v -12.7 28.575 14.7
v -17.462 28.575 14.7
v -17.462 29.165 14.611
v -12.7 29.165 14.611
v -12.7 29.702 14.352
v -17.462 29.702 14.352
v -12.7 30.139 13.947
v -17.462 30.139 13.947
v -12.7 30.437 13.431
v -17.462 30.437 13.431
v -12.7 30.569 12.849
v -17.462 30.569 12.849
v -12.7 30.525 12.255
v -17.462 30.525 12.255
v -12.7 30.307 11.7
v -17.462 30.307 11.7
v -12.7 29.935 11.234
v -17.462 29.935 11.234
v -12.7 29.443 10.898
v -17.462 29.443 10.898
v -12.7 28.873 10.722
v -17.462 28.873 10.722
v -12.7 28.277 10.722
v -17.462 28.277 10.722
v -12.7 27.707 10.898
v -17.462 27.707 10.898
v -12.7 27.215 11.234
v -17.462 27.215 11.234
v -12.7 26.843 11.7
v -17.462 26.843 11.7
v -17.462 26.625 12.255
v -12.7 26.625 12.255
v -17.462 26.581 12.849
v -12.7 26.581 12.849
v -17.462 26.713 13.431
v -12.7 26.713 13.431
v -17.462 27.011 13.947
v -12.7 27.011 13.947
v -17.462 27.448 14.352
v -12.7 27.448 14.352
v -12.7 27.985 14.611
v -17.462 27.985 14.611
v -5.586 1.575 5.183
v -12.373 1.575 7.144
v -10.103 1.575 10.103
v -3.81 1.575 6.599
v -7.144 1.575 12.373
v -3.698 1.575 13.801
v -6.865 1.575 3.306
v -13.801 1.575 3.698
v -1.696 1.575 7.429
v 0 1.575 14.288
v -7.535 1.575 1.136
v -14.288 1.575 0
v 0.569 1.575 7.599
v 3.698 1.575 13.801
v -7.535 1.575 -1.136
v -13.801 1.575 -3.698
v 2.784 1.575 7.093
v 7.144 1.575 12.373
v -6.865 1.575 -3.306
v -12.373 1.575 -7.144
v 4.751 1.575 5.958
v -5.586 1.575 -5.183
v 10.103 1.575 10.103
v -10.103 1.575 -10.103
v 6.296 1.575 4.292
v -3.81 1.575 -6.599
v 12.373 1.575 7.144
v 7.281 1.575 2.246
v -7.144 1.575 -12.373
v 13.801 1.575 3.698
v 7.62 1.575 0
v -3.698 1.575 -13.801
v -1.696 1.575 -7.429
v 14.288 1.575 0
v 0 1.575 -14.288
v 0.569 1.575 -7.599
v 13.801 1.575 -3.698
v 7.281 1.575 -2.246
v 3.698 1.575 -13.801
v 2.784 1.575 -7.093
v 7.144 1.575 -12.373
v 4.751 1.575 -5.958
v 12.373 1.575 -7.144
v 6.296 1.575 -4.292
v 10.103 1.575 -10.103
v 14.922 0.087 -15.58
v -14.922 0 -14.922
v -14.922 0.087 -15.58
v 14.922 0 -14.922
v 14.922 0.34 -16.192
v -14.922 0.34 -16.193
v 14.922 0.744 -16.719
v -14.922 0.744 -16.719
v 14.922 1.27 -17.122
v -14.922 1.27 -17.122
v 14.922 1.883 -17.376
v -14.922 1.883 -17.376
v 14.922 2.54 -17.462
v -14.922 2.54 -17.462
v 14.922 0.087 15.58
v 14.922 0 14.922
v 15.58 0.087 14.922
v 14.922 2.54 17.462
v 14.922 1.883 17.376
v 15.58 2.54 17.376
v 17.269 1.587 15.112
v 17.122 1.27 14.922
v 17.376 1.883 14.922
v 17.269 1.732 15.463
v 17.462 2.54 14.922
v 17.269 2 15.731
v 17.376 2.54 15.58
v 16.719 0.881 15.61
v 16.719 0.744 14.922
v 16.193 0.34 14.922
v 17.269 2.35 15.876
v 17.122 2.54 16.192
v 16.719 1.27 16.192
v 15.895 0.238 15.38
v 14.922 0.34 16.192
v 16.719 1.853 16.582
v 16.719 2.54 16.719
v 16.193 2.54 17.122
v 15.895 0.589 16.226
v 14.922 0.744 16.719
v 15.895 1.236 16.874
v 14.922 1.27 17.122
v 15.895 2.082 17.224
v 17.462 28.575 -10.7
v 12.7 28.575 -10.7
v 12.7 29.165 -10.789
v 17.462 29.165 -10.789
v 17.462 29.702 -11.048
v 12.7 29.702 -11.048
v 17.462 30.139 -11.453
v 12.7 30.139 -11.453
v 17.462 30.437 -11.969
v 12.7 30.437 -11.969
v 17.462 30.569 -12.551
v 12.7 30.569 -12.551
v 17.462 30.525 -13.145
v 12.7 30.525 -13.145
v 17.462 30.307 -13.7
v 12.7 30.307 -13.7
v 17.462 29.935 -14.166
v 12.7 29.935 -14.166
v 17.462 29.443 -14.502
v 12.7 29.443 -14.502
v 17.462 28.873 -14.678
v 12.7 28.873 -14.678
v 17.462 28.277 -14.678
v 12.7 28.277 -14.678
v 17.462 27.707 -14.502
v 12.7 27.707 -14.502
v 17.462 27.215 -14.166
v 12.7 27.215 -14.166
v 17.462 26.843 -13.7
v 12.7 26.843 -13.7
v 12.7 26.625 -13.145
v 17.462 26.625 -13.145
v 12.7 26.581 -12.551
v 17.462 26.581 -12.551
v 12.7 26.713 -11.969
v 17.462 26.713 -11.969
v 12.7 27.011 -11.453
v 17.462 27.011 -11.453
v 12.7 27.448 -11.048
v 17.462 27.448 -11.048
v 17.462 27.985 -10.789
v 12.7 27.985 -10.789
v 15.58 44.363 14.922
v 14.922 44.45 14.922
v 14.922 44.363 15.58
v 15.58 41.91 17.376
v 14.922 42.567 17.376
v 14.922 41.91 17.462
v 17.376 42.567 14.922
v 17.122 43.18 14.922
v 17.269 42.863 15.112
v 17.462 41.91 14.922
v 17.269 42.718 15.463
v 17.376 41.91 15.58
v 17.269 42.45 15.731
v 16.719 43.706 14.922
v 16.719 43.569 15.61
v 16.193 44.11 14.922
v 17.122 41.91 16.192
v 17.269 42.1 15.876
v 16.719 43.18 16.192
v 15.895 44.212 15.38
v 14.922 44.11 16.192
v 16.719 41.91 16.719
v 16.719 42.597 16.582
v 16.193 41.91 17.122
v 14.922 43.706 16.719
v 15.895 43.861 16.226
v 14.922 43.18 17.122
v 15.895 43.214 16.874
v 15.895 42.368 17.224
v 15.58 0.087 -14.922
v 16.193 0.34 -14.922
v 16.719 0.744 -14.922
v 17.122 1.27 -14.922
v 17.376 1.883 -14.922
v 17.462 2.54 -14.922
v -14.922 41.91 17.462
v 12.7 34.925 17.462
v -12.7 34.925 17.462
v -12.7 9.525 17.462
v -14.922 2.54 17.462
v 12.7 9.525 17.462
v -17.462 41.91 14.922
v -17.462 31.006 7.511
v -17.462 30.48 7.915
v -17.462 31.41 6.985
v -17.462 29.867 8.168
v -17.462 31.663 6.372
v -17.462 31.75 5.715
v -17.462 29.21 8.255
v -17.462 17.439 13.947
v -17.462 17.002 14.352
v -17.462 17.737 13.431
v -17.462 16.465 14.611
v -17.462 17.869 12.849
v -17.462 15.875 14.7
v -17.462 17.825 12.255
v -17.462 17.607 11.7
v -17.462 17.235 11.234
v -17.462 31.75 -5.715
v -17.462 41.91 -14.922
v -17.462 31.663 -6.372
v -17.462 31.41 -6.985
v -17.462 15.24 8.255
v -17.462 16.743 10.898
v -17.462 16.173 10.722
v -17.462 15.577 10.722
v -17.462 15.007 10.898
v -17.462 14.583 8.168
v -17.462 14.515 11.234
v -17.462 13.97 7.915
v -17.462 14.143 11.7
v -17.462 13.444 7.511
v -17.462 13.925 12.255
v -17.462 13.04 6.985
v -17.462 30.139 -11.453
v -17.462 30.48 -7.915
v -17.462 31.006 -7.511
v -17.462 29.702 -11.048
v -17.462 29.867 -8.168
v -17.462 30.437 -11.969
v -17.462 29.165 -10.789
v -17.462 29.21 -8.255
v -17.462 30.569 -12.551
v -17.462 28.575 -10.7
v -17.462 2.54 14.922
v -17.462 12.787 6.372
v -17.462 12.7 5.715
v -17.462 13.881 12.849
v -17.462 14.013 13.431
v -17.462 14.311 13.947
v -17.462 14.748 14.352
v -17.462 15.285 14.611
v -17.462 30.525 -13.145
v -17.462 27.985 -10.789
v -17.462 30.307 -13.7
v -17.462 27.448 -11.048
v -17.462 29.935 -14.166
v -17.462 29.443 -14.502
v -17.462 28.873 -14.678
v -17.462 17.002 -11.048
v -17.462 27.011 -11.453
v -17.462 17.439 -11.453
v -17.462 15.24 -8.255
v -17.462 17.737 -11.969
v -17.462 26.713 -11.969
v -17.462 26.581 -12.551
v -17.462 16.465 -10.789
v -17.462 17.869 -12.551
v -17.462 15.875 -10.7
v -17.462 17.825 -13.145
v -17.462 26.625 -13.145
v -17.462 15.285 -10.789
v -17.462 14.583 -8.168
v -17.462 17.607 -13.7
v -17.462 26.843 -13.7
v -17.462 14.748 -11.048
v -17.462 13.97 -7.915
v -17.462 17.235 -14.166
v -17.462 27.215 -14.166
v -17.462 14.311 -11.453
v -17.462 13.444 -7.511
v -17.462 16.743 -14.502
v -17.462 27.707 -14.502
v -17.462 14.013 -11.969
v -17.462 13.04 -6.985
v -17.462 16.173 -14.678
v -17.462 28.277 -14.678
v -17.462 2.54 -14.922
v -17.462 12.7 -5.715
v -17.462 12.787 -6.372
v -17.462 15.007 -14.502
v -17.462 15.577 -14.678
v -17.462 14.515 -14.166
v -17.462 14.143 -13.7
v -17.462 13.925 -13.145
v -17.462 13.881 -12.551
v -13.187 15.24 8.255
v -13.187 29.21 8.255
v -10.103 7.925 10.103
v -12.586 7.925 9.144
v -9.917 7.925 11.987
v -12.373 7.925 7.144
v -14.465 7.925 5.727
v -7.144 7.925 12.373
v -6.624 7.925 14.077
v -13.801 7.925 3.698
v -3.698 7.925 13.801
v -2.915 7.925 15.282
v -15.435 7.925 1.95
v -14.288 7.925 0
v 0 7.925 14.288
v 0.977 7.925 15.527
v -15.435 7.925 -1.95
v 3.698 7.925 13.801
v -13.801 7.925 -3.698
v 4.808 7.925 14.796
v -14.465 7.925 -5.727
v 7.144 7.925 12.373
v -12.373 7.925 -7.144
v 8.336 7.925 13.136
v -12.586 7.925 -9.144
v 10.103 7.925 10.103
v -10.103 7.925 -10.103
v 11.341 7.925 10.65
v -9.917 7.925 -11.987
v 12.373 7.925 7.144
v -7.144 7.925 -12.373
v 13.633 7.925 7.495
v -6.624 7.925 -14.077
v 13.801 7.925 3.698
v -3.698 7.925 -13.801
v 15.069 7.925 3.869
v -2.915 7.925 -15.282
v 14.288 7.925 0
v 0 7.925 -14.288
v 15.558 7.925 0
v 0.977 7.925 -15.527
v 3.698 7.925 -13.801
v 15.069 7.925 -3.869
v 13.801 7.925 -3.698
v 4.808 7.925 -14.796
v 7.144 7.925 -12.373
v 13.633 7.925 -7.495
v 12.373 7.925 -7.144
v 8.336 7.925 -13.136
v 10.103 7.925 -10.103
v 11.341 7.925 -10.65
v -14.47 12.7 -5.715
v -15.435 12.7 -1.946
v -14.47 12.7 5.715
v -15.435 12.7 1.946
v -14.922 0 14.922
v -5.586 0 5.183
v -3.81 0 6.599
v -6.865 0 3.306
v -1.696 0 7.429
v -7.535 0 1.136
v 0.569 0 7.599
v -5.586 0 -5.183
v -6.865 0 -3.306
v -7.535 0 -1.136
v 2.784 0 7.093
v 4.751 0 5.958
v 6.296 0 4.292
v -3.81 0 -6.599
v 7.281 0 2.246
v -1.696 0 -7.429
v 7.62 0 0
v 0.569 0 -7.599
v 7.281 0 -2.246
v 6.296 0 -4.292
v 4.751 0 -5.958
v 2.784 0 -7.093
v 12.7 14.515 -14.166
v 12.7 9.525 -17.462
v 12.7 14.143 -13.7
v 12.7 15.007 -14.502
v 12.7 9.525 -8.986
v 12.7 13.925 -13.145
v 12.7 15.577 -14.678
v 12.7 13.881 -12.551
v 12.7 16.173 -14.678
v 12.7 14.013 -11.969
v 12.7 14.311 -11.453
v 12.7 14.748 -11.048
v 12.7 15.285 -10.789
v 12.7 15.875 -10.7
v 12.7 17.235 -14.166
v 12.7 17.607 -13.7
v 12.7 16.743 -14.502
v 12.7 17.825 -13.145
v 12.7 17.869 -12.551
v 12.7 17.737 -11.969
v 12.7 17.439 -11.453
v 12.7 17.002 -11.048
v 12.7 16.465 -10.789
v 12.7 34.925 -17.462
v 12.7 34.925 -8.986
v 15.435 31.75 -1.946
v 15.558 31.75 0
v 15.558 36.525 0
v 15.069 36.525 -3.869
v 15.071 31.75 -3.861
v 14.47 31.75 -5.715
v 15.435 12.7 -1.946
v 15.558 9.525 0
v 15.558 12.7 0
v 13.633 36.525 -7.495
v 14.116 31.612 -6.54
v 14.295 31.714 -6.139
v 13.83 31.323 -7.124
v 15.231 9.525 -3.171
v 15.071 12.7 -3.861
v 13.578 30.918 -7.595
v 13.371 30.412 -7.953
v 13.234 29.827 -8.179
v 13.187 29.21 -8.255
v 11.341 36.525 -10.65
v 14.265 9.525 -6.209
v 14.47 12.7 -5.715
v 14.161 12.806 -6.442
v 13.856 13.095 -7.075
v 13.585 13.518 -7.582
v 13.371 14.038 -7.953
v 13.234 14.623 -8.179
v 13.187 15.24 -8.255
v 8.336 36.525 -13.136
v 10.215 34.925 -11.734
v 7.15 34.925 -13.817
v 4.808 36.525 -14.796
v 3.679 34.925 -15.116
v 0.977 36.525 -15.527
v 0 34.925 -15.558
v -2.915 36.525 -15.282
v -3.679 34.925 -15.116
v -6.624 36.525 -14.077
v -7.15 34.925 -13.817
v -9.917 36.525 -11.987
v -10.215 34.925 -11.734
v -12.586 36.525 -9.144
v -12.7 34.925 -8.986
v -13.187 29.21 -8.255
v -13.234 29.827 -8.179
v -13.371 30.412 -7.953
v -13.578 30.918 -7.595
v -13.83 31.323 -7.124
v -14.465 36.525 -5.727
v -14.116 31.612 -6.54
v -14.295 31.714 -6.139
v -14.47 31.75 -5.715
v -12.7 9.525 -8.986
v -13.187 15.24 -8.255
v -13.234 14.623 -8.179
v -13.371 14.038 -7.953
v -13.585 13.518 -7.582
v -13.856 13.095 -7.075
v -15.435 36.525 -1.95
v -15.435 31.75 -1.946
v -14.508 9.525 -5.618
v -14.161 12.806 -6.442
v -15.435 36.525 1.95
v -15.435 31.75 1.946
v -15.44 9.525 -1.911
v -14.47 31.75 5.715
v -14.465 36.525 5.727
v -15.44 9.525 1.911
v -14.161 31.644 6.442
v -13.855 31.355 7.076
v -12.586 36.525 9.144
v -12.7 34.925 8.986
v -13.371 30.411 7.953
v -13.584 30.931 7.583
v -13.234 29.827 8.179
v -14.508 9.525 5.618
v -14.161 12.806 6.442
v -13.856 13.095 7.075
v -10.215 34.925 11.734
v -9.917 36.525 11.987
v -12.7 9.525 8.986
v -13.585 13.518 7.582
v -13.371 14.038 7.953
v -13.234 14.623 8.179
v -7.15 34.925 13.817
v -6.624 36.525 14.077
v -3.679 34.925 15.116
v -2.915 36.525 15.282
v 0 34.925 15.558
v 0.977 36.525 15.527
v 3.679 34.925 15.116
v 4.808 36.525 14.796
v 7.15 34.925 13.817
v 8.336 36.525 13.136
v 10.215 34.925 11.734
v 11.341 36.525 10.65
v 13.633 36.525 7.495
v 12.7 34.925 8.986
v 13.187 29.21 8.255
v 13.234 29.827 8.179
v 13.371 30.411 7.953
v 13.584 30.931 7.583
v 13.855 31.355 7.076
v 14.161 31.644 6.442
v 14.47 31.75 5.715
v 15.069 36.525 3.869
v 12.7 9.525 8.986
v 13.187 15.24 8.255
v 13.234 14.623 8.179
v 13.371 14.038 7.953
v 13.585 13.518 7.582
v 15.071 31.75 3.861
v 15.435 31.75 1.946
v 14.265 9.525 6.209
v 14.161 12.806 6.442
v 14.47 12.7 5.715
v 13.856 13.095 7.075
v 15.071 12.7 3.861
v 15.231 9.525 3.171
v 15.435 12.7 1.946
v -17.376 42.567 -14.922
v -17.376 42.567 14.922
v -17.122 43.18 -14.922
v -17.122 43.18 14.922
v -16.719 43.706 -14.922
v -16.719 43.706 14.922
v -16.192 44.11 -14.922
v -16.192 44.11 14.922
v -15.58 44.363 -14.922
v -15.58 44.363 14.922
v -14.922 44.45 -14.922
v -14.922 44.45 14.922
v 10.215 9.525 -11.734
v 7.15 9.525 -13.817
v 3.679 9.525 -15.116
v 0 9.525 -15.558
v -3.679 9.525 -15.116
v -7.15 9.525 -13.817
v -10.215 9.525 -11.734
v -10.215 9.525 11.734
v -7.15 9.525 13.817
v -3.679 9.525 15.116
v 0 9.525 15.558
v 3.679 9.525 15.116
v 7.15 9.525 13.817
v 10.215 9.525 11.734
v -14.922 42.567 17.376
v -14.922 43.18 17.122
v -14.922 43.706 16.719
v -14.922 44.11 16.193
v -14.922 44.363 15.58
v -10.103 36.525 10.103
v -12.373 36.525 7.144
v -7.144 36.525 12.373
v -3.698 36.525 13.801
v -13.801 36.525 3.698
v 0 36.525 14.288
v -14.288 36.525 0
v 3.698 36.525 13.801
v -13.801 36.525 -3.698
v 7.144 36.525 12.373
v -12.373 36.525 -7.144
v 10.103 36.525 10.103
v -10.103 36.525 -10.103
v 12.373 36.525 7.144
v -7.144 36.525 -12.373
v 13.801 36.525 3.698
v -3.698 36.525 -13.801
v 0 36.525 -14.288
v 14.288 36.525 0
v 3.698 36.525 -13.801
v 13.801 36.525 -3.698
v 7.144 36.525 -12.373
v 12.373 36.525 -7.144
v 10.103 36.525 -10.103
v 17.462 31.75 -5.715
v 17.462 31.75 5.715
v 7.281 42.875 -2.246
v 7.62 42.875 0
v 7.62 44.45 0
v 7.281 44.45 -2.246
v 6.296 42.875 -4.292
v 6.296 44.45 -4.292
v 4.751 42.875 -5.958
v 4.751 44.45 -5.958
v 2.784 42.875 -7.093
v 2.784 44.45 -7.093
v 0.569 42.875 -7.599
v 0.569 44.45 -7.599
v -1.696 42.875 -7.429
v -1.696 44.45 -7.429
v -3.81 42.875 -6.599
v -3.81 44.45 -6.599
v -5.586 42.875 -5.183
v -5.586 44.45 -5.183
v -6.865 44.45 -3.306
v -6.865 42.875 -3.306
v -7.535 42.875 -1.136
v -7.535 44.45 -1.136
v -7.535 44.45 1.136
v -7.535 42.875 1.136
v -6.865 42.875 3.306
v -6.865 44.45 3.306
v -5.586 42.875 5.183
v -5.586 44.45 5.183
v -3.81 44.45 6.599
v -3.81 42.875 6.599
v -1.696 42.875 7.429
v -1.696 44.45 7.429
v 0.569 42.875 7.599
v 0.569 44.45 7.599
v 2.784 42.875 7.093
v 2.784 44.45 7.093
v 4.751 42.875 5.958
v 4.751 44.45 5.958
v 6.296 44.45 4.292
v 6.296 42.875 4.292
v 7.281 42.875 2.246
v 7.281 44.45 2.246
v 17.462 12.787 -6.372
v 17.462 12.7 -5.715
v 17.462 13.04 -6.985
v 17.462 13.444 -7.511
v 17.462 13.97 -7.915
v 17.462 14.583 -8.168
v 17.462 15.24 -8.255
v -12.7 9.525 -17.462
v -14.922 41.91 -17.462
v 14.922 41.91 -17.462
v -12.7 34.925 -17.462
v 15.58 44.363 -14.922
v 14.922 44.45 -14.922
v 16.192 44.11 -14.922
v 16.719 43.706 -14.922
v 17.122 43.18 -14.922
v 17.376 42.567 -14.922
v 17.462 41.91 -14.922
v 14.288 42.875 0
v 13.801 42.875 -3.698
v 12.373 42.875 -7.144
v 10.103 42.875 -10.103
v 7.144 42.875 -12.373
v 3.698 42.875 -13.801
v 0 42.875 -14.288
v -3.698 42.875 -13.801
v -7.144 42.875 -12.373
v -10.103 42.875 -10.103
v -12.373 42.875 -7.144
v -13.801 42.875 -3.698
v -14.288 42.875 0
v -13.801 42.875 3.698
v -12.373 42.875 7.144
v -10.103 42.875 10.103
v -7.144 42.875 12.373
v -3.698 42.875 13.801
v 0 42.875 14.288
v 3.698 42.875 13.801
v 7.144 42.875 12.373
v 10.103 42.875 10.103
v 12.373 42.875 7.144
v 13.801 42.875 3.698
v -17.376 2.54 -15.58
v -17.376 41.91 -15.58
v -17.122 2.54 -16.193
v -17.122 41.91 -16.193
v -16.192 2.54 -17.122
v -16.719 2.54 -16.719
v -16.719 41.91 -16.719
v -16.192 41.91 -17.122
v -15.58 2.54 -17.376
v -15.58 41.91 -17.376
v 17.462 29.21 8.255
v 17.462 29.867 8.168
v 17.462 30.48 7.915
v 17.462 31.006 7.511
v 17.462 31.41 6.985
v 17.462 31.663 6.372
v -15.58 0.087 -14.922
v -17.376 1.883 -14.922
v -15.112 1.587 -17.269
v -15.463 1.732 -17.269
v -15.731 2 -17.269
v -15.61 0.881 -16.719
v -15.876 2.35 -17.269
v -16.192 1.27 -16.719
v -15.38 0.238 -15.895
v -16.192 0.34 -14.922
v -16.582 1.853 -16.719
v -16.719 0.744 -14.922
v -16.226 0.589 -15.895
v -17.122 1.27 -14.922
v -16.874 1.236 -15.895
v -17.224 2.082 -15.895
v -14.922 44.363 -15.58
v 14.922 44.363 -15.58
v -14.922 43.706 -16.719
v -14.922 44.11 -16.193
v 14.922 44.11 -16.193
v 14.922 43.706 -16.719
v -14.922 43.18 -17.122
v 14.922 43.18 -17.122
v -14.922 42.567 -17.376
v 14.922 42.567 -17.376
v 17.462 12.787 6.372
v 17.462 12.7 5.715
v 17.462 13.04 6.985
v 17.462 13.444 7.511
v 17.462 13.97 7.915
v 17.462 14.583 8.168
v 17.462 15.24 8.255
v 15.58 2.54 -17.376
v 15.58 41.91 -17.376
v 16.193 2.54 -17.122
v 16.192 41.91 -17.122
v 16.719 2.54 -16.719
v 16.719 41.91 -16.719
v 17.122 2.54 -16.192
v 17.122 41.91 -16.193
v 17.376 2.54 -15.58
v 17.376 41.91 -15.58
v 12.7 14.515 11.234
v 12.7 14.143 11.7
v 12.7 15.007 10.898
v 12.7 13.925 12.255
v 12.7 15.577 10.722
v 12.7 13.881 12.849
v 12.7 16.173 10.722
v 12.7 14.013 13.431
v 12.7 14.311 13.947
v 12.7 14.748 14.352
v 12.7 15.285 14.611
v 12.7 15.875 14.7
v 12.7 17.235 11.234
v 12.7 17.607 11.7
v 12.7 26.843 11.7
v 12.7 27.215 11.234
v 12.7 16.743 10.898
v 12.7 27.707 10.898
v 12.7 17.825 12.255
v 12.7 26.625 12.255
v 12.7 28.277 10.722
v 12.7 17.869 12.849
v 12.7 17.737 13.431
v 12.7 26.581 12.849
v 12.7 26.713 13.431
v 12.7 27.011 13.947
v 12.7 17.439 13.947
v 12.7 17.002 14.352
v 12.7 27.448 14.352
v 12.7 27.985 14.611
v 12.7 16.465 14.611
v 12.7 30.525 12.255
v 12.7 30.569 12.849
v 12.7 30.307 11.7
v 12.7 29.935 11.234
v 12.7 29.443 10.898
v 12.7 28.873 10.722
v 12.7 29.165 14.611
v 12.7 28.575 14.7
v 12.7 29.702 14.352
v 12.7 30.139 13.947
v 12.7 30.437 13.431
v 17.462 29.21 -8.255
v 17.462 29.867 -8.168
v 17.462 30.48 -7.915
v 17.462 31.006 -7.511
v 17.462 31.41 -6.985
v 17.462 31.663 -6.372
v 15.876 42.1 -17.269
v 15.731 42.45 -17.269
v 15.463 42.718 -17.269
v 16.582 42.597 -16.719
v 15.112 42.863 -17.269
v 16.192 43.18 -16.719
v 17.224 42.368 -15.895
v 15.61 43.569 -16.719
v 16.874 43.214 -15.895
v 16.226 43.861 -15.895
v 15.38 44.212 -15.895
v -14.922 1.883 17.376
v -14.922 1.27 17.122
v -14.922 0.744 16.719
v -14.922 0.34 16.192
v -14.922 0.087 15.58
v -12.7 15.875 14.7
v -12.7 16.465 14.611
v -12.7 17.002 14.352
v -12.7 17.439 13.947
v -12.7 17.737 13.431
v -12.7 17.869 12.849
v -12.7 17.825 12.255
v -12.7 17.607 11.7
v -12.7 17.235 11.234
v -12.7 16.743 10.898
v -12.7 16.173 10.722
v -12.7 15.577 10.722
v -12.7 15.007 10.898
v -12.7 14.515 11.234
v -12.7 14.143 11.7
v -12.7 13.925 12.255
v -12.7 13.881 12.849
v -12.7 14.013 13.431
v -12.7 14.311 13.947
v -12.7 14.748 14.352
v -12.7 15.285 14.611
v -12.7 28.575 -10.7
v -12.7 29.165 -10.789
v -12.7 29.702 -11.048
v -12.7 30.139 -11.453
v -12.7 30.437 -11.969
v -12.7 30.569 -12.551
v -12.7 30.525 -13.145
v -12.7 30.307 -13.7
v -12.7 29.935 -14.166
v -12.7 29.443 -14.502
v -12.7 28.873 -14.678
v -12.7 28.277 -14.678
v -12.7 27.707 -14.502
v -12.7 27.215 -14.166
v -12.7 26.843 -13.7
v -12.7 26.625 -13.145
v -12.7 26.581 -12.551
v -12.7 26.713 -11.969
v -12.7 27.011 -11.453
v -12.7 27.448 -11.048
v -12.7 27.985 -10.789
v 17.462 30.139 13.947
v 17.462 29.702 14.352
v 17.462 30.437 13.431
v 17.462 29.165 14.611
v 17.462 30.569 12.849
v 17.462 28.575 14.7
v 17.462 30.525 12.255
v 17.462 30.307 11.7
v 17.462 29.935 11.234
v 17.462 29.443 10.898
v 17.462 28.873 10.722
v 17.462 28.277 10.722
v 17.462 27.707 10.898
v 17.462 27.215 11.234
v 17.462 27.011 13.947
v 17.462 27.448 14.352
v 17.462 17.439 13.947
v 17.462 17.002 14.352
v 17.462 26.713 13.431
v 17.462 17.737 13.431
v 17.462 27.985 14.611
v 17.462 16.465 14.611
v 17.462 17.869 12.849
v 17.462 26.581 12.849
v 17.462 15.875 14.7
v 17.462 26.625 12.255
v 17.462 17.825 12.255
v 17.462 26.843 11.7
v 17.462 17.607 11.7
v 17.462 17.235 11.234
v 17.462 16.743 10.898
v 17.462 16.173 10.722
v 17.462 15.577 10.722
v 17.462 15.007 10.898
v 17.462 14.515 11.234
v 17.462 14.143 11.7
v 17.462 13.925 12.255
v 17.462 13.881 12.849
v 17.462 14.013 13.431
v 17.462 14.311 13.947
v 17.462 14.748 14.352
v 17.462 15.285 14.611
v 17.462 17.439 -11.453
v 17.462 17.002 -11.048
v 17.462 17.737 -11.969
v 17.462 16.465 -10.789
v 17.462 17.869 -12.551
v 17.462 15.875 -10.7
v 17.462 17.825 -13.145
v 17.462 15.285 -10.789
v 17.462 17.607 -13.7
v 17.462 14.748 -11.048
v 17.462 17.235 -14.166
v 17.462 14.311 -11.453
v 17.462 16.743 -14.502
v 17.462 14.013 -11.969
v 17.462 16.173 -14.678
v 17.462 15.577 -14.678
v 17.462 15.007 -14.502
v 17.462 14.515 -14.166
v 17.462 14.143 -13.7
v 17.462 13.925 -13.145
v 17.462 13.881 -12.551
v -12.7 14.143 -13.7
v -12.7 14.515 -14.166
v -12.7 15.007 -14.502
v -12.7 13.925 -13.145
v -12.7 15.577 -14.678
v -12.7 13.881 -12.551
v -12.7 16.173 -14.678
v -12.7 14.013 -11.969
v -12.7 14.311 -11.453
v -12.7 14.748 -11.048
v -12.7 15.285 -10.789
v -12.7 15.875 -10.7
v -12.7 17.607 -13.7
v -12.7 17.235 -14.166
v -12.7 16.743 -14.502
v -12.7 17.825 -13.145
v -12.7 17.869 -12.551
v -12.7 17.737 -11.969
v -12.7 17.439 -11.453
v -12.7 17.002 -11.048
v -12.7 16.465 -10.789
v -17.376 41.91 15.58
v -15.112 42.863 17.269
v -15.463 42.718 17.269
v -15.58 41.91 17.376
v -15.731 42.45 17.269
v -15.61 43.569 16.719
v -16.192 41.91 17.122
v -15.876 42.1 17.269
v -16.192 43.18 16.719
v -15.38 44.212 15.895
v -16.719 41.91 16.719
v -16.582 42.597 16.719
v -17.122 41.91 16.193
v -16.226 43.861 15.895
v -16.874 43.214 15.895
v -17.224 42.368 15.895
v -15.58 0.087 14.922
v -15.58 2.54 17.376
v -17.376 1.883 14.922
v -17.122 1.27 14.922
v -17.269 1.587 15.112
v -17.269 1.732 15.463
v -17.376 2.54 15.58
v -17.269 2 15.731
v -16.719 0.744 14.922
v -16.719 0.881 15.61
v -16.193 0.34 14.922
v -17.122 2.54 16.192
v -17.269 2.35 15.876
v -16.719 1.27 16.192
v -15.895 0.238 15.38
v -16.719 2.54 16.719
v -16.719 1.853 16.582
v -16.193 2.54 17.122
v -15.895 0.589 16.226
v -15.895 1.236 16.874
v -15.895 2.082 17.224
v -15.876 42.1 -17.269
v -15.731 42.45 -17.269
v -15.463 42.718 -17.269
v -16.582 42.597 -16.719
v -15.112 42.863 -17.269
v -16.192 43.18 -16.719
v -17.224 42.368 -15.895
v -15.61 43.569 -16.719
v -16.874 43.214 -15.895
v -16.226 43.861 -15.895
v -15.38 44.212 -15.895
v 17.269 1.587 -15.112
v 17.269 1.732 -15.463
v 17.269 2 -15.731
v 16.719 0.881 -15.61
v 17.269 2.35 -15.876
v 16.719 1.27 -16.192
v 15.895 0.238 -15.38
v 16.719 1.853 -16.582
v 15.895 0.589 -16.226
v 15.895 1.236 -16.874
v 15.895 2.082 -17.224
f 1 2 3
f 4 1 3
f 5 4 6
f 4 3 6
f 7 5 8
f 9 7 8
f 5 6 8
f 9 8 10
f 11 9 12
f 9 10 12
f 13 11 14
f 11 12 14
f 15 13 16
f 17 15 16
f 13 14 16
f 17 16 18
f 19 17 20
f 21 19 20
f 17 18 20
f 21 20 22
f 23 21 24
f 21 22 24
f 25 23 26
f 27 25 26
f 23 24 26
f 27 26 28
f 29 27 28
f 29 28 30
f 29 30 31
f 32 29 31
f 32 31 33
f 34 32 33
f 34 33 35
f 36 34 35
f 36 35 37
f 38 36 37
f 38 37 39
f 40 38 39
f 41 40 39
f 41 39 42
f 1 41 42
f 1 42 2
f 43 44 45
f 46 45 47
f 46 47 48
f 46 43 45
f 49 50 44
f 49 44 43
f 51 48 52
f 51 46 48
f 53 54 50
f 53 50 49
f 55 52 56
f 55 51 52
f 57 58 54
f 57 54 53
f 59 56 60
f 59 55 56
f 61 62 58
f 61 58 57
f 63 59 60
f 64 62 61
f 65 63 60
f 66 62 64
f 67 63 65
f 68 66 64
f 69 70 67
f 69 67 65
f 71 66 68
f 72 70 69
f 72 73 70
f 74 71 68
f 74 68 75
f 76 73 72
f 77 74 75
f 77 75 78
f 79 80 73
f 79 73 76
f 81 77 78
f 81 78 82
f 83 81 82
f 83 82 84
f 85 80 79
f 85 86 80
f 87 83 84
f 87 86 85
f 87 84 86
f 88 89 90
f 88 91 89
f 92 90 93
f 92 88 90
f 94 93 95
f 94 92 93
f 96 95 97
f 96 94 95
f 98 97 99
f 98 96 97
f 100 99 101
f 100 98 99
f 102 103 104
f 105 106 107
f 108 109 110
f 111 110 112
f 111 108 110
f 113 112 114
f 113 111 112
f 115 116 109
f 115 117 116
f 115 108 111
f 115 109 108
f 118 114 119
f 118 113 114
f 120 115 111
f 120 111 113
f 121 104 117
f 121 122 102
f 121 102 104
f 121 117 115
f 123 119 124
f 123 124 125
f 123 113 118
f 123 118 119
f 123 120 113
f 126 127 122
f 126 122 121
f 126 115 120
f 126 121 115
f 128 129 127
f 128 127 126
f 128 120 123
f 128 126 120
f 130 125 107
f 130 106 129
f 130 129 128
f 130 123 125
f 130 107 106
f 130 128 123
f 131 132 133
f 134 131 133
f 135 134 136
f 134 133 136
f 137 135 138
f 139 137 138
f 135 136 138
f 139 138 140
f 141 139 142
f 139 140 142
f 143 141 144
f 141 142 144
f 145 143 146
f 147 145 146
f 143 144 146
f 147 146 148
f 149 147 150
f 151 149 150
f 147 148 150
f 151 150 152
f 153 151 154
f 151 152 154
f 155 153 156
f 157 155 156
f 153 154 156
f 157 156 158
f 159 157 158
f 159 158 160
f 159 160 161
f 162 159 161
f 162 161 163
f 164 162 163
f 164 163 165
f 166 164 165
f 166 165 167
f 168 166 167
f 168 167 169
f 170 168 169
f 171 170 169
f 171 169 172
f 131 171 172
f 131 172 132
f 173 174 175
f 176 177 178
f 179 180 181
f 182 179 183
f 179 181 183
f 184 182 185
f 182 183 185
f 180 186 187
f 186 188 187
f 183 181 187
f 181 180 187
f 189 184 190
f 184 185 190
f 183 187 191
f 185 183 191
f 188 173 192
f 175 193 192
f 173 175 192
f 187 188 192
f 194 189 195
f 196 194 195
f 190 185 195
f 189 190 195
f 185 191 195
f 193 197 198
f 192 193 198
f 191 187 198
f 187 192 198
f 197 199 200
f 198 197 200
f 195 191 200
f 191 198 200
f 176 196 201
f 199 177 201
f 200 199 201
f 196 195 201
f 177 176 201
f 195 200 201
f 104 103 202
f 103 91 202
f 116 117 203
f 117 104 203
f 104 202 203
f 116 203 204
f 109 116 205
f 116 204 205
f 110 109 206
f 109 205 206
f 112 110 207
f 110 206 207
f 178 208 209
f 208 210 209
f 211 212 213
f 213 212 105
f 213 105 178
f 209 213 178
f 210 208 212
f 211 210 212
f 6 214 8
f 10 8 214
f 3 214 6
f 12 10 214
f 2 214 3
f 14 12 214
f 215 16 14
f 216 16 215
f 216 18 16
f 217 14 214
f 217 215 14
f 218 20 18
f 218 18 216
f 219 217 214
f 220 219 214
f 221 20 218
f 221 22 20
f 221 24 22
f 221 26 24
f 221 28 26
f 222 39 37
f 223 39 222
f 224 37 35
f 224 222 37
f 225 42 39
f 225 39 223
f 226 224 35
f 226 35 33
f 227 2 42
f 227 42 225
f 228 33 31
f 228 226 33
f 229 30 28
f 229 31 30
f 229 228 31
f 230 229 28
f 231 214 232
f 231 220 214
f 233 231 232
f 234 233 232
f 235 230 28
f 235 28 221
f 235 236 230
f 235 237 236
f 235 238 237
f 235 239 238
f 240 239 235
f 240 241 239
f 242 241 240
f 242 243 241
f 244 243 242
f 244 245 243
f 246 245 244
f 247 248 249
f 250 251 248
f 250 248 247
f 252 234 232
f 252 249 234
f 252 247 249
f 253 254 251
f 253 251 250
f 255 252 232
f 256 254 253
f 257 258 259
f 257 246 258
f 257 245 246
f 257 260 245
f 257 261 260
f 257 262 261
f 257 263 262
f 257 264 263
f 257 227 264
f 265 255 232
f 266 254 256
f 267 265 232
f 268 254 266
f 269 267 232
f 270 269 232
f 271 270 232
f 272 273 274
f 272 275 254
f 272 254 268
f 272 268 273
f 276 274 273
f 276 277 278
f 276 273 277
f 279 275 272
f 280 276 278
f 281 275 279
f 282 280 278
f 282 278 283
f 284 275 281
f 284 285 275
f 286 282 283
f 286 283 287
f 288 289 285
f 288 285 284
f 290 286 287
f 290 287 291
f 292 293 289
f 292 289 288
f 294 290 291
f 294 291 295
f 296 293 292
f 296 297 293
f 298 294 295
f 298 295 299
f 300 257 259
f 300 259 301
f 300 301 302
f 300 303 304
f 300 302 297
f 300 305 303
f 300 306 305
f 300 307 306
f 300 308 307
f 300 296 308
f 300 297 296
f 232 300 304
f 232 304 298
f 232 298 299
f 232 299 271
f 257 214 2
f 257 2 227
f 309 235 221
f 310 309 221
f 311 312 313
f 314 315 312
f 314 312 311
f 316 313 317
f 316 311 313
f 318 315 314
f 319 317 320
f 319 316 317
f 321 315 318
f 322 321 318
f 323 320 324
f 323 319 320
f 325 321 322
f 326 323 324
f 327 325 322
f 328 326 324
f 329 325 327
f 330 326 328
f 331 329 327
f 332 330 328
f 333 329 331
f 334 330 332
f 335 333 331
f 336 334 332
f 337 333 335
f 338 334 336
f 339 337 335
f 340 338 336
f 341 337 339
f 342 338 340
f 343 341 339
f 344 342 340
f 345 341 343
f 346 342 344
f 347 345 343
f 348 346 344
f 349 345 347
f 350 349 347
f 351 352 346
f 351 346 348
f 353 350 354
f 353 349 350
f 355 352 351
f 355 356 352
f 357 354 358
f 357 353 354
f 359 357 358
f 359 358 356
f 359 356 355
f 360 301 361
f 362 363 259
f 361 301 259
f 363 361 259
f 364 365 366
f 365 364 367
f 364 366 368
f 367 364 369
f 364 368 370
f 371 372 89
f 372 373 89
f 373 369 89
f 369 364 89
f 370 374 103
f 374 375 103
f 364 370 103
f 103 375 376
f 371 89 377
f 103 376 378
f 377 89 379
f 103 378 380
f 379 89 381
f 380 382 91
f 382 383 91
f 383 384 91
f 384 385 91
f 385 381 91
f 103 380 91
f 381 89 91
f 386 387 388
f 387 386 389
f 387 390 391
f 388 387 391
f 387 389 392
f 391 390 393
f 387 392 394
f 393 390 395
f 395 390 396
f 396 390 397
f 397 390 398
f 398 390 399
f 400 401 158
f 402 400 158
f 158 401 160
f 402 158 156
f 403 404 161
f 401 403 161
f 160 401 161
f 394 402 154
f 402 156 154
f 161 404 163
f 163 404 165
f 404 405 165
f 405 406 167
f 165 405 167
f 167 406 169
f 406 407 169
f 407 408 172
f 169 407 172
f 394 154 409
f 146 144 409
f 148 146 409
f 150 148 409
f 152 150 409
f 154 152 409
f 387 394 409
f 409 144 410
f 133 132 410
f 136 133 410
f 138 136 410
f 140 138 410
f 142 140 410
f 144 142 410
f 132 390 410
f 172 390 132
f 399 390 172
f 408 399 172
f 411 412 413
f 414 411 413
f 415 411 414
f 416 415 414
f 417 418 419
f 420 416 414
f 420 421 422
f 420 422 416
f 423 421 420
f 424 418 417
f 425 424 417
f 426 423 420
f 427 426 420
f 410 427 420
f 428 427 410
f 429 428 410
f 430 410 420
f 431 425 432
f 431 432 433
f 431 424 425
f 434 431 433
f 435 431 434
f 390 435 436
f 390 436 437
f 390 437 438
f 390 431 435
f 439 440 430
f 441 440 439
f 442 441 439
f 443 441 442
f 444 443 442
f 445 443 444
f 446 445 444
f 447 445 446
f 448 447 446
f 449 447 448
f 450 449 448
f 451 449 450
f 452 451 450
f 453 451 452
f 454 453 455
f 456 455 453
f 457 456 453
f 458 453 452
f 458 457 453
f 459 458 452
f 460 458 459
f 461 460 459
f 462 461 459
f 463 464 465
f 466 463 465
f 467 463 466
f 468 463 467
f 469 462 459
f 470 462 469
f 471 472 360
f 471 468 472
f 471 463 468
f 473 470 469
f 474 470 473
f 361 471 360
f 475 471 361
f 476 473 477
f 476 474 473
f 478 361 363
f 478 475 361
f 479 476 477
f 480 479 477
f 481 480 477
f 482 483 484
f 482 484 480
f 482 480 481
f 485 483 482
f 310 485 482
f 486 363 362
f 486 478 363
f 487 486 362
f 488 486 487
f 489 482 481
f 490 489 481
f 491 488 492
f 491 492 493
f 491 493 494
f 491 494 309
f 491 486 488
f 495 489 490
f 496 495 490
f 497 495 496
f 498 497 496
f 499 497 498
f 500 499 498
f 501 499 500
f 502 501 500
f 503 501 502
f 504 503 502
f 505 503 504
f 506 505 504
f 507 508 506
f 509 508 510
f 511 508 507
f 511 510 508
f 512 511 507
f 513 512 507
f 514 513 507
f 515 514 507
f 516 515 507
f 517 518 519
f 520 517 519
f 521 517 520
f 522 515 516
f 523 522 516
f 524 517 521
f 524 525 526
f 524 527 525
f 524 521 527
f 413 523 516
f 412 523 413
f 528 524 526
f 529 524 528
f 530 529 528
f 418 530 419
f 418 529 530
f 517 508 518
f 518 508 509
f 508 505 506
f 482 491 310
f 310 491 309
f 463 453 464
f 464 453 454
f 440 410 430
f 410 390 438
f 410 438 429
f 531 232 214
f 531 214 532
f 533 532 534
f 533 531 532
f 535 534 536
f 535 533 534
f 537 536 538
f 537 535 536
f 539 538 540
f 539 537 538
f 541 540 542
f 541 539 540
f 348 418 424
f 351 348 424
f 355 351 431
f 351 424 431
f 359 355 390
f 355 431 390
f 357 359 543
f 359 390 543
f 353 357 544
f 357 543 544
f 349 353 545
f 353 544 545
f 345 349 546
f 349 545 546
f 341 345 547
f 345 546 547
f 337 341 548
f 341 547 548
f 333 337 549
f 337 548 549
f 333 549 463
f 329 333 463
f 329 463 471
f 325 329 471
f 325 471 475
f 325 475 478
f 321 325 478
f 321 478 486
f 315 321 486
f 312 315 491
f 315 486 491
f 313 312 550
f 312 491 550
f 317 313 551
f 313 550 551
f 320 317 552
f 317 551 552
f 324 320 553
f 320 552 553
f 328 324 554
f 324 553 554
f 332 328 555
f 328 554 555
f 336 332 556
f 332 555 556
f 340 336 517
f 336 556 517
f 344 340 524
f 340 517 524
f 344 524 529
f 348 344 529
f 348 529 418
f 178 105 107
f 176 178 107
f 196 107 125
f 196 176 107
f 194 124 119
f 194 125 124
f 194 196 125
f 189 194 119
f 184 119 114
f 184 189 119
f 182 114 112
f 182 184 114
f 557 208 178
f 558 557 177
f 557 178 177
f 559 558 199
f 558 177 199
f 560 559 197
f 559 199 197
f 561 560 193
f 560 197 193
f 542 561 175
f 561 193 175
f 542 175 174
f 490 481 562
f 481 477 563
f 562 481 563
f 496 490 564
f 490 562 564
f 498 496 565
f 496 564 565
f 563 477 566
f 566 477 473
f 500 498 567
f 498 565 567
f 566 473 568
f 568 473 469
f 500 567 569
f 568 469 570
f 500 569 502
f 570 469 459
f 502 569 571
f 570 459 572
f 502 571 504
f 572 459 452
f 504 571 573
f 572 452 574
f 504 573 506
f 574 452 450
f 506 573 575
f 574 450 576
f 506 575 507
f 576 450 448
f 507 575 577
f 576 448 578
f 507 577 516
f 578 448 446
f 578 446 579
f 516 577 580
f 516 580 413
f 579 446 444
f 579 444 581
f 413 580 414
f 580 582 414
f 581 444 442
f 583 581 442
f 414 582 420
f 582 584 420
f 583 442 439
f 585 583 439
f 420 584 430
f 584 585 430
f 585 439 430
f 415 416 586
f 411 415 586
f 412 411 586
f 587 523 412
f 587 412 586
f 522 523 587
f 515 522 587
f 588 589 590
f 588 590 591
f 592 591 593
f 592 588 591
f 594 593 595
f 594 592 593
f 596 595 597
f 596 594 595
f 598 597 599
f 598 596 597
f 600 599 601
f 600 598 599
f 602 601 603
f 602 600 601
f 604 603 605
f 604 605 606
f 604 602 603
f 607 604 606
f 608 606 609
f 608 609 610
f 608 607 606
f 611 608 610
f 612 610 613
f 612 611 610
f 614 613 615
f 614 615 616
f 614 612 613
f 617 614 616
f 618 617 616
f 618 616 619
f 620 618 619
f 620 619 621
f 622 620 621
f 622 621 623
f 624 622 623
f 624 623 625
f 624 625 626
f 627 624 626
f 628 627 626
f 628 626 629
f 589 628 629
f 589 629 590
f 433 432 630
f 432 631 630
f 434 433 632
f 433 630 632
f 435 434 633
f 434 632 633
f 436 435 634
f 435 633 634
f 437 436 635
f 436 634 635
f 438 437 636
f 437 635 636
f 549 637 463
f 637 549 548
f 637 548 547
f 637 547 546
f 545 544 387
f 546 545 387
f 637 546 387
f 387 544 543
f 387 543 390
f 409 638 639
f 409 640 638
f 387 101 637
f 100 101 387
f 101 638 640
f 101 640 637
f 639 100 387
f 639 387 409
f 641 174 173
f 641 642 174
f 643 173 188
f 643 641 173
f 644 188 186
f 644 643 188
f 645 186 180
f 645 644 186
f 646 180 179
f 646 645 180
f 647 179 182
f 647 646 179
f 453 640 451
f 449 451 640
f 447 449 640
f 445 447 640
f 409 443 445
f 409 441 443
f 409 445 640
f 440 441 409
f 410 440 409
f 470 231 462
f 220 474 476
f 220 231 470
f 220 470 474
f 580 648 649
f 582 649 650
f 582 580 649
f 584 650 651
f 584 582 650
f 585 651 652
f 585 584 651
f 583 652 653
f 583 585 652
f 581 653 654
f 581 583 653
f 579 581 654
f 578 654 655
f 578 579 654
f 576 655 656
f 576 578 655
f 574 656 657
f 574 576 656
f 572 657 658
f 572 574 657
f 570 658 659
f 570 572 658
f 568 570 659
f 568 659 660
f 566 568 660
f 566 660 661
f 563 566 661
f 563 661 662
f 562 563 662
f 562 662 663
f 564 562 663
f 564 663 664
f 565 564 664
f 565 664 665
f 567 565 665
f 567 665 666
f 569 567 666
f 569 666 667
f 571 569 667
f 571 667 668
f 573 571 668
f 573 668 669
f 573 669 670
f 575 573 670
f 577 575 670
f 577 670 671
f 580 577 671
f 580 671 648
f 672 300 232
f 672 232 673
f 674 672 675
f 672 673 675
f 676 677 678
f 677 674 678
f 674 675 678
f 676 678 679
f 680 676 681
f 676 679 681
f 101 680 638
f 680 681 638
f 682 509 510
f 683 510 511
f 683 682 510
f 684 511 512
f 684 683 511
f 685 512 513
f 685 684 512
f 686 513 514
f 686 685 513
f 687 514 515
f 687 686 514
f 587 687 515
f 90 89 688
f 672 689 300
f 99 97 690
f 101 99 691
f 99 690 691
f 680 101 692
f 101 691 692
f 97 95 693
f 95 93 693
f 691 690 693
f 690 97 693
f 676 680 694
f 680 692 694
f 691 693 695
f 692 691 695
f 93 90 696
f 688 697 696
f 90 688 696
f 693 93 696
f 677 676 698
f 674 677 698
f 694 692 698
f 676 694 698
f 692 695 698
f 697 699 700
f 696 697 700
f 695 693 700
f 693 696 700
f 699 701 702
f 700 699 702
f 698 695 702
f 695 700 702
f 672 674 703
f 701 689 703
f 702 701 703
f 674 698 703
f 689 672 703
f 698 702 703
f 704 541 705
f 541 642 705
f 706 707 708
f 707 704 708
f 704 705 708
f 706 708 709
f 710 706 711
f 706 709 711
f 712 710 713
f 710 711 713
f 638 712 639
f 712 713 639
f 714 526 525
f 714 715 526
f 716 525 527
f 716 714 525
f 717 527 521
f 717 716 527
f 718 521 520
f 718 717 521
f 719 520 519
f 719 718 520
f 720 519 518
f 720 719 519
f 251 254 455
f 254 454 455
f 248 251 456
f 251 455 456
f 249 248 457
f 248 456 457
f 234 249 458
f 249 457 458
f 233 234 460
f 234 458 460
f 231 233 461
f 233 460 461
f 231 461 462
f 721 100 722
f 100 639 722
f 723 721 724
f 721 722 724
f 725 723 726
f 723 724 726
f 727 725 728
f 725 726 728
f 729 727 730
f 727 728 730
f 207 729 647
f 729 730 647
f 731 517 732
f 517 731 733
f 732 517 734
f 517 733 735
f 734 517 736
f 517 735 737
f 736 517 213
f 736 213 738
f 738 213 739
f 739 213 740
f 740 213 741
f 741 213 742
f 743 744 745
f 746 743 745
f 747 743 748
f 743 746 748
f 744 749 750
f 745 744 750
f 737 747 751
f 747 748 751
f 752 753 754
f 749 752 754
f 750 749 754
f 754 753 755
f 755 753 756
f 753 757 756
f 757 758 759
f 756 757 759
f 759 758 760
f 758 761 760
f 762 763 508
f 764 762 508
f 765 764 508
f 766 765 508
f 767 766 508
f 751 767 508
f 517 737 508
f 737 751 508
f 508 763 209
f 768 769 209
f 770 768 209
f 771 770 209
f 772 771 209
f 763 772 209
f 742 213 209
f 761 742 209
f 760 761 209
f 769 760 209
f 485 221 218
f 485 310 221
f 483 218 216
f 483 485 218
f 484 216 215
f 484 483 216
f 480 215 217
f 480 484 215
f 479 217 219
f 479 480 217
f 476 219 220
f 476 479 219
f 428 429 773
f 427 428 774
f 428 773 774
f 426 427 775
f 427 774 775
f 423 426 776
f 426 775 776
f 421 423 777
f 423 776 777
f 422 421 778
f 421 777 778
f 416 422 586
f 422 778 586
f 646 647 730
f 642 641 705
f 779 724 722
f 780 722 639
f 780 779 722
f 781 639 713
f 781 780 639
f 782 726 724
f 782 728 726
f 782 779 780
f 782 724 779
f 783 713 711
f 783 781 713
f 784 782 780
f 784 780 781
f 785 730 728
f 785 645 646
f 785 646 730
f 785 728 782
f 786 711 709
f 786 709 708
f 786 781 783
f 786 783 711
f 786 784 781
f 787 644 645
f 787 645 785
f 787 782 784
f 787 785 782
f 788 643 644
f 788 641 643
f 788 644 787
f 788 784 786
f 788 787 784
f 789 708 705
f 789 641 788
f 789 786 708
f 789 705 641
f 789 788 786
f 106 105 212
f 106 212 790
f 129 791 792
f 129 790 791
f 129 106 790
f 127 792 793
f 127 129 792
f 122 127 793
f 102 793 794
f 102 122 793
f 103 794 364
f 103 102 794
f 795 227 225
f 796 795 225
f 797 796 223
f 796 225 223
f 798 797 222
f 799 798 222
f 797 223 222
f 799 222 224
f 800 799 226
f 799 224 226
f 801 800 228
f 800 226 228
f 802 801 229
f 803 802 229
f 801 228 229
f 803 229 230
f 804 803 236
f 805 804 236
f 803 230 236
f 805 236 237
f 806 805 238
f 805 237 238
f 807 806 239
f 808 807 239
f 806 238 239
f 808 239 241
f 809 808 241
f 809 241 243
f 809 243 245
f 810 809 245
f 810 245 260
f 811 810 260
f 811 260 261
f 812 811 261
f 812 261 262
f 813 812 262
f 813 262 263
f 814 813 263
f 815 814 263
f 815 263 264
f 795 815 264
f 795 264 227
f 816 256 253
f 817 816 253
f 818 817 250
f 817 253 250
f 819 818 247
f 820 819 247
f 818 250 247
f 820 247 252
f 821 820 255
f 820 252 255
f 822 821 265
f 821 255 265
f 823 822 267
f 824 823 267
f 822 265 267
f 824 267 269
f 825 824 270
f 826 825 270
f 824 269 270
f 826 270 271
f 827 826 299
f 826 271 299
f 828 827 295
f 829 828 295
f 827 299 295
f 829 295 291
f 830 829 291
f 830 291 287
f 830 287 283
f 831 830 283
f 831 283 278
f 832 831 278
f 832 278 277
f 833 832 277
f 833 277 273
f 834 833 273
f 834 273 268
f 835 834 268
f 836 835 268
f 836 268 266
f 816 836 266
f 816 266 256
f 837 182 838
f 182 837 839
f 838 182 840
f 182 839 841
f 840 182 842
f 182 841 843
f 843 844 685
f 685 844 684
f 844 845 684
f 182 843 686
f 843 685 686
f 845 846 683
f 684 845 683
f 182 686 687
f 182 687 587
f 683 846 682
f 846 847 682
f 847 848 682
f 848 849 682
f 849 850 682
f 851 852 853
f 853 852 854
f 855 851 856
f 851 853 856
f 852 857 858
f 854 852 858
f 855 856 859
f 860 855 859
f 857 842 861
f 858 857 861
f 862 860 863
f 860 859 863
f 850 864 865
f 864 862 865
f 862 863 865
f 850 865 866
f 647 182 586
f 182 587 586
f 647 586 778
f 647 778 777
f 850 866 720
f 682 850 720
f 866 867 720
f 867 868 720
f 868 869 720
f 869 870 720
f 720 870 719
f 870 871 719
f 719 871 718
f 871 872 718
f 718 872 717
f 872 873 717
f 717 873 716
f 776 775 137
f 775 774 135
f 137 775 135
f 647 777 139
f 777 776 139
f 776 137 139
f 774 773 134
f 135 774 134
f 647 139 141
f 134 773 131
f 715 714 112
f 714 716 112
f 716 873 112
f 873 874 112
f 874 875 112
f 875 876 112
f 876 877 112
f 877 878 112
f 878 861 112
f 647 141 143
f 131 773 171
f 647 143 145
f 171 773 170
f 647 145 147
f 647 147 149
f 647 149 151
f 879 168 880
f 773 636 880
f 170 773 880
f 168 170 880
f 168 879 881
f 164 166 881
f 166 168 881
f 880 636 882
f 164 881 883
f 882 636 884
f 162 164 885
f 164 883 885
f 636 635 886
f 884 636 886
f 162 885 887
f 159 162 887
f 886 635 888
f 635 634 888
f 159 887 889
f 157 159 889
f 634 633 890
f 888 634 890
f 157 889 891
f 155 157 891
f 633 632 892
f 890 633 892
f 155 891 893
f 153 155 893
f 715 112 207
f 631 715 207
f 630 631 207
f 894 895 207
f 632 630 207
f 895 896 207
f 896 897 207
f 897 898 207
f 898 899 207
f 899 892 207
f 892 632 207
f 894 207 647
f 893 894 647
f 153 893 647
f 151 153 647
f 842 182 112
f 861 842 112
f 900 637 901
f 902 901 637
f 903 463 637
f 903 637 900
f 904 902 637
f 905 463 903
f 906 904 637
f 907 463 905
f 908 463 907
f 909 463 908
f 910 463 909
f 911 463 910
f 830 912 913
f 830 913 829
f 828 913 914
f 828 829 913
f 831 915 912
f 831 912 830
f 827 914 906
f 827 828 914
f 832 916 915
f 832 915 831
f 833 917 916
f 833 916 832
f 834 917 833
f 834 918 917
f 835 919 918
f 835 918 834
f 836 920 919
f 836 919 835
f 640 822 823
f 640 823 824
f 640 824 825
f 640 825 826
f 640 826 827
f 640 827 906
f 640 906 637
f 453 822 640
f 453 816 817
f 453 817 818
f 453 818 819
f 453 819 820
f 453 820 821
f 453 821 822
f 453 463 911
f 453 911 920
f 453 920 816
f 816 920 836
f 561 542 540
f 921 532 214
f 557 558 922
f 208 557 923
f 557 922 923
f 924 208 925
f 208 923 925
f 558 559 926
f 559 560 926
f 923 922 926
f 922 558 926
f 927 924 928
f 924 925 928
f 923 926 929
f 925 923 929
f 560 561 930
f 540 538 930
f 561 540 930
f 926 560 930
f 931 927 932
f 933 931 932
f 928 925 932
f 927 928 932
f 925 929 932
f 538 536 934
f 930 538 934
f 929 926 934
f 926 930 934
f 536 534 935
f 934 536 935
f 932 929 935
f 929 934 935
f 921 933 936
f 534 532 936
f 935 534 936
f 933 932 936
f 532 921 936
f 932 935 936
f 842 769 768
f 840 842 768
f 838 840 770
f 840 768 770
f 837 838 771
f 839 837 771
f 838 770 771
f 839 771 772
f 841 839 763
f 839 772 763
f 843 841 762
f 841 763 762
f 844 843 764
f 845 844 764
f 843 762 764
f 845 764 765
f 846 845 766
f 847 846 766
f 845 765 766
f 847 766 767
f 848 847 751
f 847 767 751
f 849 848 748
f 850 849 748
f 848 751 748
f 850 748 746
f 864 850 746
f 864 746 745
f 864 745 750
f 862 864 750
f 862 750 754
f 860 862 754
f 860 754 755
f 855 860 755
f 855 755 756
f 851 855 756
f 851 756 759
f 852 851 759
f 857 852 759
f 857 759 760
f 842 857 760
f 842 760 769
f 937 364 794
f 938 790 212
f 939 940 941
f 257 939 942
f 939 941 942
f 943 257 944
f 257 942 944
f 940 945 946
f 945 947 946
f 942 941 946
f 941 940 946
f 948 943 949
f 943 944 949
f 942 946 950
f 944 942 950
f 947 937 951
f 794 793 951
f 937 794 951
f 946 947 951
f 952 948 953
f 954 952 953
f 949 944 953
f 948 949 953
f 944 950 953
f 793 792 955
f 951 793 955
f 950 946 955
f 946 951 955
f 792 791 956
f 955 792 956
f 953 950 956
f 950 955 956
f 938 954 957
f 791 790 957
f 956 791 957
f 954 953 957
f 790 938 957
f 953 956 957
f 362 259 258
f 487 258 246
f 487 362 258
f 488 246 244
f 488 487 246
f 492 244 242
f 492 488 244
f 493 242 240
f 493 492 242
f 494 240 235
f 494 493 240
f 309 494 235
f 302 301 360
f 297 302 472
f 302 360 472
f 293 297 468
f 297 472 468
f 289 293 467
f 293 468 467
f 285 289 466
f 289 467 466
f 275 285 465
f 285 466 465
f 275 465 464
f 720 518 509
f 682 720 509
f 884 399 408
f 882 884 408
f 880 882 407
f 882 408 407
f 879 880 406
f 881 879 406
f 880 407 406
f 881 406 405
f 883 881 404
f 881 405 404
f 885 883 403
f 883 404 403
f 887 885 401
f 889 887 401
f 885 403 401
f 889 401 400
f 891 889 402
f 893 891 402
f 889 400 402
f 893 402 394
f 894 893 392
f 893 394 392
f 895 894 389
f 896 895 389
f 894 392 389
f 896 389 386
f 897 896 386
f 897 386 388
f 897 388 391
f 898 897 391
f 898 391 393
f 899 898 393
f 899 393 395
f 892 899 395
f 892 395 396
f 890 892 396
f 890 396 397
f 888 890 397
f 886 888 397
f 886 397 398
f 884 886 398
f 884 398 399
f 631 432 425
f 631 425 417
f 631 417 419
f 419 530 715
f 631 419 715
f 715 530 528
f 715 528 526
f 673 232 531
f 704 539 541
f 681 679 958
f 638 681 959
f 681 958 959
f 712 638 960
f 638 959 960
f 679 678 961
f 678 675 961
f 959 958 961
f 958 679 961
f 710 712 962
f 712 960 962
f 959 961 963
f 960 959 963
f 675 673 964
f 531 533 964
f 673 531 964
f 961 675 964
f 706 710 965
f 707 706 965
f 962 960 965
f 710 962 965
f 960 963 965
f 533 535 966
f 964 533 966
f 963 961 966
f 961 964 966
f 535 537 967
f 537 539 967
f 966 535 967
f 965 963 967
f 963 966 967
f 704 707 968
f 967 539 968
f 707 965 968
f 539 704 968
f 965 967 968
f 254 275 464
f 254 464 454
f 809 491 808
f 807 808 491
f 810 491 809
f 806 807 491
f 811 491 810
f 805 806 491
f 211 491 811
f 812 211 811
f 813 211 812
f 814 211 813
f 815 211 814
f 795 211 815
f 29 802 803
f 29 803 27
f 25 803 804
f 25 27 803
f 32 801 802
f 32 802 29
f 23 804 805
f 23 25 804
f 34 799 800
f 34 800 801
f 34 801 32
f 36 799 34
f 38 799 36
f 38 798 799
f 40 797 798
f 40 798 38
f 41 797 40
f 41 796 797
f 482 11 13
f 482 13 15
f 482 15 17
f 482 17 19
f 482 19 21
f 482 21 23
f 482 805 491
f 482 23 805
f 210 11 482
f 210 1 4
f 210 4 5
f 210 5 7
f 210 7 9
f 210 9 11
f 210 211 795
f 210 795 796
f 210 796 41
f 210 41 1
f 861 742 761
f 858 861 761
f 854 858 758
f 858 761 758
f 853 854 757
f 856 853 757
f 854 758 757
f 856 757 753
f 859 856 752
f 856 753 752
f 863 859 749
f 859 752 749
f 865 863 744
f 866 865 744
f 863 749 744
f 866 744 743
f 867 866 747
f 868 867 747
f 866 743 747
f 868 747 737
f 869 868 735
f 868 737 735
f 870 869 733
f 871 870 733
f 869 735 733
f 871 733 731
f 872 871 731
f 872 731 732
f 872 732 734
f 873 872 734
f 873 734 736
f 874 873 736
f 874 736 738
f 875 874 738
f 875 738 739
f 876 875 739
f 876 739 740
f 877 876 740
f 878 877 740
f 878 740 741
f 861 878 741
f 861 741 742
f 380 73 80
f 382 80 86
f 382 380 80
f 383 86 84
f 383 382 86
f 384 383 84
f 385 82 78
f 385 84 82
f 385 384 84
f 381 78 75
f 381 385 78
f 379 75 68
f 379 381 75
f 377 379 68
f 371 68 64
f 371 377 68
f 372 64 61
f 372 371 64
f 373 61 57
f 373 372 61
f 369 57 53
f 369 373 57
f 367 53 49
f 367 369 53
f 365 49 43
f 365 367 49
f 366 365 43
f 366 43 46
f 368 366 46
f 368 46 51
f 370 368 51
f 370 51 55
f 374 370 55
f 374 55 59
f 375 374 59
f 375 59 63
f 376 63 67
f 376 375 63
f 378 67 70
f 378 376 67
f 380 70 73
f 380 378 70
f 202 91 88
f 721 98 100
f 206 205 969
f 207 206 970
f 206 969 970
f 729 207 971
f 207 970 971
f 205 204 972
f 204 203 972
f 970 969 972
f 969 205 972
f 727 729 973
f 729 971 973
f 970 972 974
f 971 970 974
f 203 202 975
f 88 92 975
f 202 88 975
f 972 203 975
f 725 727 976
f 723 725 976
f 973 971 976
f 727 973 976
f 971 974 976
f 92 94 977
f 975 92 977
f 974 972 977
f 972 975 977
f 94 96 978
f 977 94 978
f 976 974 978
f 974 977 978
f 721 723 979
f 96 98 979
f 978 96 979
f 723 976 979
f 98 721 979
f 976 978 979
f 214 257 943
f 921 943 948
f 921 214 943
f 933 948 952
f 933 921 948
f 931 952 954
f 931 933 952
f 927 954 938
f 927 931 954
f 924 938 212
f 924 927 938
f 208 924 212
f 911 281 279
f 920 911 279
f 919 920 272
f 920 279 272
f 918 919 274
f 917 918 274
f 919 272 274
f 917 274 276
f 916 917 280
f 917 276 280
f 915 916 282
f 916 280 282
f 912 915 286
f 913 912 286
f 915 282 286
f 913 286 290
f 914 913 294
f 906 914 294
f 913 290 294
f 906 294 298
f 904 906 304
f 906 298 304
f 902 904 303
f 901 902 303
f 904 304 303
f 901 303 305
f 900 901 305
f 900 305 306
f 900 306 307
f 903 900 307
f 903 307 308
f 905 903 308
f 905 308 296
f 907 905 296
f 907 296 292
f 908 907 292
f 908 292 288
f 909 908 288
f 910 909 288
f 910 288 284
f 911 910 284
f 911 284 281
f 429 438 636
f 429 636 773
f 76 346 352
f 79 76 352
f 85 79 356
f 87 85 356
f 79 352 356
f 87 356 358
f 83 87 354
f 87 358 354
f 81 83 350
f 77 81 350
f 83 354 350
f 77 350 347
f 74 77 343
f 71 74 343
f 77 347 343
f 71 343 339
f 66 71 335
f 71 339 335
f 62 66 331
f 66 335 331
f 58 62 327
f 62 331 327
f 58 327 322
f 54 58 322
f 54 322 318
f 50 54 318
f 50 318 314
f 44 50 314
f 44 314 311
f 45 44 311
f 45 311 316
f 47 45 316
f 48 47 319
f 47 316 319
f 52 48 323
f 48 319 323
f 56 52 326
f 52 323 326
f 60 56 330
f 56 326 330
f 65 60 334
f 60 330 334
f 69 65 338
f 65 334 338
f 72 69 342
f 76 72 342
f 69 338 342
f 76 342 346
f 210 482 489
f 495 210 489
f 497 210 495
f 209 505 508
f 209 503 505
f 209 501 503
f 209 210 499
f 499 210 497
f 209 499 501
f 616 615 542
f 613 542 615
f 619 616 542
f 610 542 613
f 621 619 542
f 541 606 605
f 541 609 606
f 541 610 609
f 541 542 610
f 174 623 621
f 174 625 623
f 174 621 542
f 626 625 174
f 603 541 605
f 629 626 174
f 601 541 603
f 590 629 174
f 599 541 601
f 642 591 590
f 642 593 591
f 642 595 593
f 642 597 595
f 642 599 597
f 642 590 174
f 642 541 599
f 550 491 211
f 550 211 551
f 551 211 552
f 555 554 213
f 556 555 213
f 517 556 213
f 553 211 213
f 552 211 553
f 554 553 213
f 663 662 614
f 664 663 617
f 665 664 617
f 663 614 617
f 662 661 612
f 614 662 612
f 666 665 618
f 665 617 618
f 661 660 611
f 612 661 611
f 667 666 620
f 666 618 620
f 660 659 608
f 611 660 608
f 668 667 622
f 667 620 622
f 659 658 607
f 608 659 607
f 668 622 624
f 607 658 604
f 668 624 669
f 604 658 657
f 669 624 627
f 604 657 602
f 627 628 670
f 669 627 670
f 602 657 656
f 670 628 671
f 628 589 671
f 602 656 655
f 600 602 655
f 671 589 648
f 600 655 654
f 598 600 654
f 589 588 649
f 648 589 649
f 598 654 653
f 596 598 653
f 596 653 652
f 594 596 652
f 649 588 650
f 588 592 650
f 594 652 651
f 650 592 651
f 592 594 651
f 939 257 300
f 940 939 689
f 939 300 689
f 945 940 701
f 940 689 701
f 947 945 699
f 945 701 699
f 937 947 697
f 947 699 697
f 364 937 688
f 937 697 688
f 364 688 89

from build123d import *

# Parameters (mm, degrees)
SKETCH1_W               = 34.925
SKETCH1_H               = 34.925
SKETCH1_R               = 7.62
BOSS_EXTRUDE1_DEPTH     = 44.45
SKETCH2_W               = 25.4
SKETCH2_H               = 25.4
CUT_EXTRUDE1_DEPTH      = 44.45
SKETCH3_R               = 15.5575
CUT_EXTRUDE2_DEPTH      = 27.0002
CUT_EXTRUDE2_DEPTH_BACK = 1.6002
SKETCH4_R               = 14.2875
CUT_EXTRUDE3_DEPTH      = 34.9504
CUT_EXTRUDE3_DEPTH_BACK = 6.35
SKETCH5_W               = 16.51
SKETCH5_H               = 19.05
CUT_EXTRUDE4_DEPTH      = 228.6
SKETCH6_R               = 2
CUT_EXTRUDE5_DEPTH      = 228.6
FILLET1_R               = 2.54


with BuildPart() as part:
    # Sketch1 → Boss-Extrude1 (new body)
    with BuildSketch(Plane(origin=(0, 0, 0), x_dir=(1, 0, 0), z_dir=(0, 1, 0))):
        Rectangle(SKETCH1_W, SKETCH1_H)
        Circle(SKETCH1_R, mode=Mode.SUBTRACT)
    extrude(amount=BOSS_EXTRUDE1_DEPTH)

    # Sketch2 → Cut-Extrude1 (cut)
    with BuildSketch(Plane.XY.offset(17.4625)):
        with Locations((0, 22.225)):
            Rectangle(SKETCH2_W, SKETCH2_H)
    extrude(amount=-CUT_EXTRUDE1_DEPTH, mode=Mode.SUBTRACT)

    # Sketch3 → Cut-Extrude2 (cut, two sides)
    with BuildSketch(Plane(origin=(0, 9.525, 0), x_dir=(1, 0, 0), z_dir=(0, 1, 0))) as cut_extrude2_sk:
        Circle(SKETCH3_R)
    extrude(amount=CUT_EXTRUDE2_DEPTH, mode=Mode.SUBTRACT)
    extrude(cut_extrude2_sk.sketch, amount=-CUT_EXTRUDE2_DEPTH_BACK, mode=Mode.SUBTRACT)

    # Sketch4 → Cut-Extrude3 (cut, two sides)
    with BuildSketch(Plane(origin=(0, 7.9248, 0), x_dir=(1, 0, 0), z_dir=(0, 1, 0))) as cut_extrude3_sk:
        Circle(SKETCH4_R)
    extrude(amount=CUT_EXTRUDE3_DEPTH, mode=Mode.SUBTRACT)
    extrude(cut_extrude3_sk.sketch, amount=-CUT_EXTRUDE3_DEPTH_BACK, mode=Mode.SUBTRACT)

    # Sketch5 → Cut-Extrude4 (cut)
    with BuildSketch(Plane.ZY.offset(17.4625)):
        with Locations((0, 22.225)):
            Rectangle(SKETCH5_W, SKETCH5_H)
    extrude(amount=-CUT_EXTRUDE4_DEPTH, mode=Mode.SUBTRACT)

    # Sketch6 → Cut-Extrude5 (cut)
    with BuildSketch(Plane.ZY.offset(17.4625)):
        with Locations((-12.7, 28.575)):
            Circle(SKETCH6_R)
        with Locations((-12.7, 15.875)):
            Circle(SKETCH6_R)
        with Locations((12.7, 15.875)):
            Circle(SKETCH6_R)
        with Locations((12.7, 28.575)):
            Circle(SKETCH6_R)
    extrude(amount=-CUT_EXTRUDE5_DEPTH, mode=Mode.SUBTRACT)

    # Fillet1
    fillet1_edges = [part.edges().sort_by_distance(p)[0] for p in [
        (-17.4625, 44.45, 0),
        (0, 44.45, 17.4625),
        (17.4625, 44.45, 0),
        (0, 0, 17.4625),
        (-17.4625, 0, 0),
        (0, 0, -17.4625),
        (17.4625, 0, 0),
        (15.324632691, 31.75, 8.255),
        (-15.324632691, 31.75, 8.255),
        (15.324632691, 12.7, 8.255),
        (17.4625, 22.225, 17.4625),
        (15.324632691, 12.7, -8.255),
        (15.324632691, 31.75, -8.255),
        (-17.4625, 22.225, 17.4625),
        (-17.4625, 22.225, -17.4625),
        (-15.324632691, 12.7, 8.255),
        (-15.324632691, 12.7, -8.255),
        (-15.324632691, 31.75, -8.255),
        (17.4625, 22.225, -17.4625),
        (0, 44.45, -17.4625),
    ]]
    fillet(fillet1_edges, radius=FILLET1_R)


solid = part.part
